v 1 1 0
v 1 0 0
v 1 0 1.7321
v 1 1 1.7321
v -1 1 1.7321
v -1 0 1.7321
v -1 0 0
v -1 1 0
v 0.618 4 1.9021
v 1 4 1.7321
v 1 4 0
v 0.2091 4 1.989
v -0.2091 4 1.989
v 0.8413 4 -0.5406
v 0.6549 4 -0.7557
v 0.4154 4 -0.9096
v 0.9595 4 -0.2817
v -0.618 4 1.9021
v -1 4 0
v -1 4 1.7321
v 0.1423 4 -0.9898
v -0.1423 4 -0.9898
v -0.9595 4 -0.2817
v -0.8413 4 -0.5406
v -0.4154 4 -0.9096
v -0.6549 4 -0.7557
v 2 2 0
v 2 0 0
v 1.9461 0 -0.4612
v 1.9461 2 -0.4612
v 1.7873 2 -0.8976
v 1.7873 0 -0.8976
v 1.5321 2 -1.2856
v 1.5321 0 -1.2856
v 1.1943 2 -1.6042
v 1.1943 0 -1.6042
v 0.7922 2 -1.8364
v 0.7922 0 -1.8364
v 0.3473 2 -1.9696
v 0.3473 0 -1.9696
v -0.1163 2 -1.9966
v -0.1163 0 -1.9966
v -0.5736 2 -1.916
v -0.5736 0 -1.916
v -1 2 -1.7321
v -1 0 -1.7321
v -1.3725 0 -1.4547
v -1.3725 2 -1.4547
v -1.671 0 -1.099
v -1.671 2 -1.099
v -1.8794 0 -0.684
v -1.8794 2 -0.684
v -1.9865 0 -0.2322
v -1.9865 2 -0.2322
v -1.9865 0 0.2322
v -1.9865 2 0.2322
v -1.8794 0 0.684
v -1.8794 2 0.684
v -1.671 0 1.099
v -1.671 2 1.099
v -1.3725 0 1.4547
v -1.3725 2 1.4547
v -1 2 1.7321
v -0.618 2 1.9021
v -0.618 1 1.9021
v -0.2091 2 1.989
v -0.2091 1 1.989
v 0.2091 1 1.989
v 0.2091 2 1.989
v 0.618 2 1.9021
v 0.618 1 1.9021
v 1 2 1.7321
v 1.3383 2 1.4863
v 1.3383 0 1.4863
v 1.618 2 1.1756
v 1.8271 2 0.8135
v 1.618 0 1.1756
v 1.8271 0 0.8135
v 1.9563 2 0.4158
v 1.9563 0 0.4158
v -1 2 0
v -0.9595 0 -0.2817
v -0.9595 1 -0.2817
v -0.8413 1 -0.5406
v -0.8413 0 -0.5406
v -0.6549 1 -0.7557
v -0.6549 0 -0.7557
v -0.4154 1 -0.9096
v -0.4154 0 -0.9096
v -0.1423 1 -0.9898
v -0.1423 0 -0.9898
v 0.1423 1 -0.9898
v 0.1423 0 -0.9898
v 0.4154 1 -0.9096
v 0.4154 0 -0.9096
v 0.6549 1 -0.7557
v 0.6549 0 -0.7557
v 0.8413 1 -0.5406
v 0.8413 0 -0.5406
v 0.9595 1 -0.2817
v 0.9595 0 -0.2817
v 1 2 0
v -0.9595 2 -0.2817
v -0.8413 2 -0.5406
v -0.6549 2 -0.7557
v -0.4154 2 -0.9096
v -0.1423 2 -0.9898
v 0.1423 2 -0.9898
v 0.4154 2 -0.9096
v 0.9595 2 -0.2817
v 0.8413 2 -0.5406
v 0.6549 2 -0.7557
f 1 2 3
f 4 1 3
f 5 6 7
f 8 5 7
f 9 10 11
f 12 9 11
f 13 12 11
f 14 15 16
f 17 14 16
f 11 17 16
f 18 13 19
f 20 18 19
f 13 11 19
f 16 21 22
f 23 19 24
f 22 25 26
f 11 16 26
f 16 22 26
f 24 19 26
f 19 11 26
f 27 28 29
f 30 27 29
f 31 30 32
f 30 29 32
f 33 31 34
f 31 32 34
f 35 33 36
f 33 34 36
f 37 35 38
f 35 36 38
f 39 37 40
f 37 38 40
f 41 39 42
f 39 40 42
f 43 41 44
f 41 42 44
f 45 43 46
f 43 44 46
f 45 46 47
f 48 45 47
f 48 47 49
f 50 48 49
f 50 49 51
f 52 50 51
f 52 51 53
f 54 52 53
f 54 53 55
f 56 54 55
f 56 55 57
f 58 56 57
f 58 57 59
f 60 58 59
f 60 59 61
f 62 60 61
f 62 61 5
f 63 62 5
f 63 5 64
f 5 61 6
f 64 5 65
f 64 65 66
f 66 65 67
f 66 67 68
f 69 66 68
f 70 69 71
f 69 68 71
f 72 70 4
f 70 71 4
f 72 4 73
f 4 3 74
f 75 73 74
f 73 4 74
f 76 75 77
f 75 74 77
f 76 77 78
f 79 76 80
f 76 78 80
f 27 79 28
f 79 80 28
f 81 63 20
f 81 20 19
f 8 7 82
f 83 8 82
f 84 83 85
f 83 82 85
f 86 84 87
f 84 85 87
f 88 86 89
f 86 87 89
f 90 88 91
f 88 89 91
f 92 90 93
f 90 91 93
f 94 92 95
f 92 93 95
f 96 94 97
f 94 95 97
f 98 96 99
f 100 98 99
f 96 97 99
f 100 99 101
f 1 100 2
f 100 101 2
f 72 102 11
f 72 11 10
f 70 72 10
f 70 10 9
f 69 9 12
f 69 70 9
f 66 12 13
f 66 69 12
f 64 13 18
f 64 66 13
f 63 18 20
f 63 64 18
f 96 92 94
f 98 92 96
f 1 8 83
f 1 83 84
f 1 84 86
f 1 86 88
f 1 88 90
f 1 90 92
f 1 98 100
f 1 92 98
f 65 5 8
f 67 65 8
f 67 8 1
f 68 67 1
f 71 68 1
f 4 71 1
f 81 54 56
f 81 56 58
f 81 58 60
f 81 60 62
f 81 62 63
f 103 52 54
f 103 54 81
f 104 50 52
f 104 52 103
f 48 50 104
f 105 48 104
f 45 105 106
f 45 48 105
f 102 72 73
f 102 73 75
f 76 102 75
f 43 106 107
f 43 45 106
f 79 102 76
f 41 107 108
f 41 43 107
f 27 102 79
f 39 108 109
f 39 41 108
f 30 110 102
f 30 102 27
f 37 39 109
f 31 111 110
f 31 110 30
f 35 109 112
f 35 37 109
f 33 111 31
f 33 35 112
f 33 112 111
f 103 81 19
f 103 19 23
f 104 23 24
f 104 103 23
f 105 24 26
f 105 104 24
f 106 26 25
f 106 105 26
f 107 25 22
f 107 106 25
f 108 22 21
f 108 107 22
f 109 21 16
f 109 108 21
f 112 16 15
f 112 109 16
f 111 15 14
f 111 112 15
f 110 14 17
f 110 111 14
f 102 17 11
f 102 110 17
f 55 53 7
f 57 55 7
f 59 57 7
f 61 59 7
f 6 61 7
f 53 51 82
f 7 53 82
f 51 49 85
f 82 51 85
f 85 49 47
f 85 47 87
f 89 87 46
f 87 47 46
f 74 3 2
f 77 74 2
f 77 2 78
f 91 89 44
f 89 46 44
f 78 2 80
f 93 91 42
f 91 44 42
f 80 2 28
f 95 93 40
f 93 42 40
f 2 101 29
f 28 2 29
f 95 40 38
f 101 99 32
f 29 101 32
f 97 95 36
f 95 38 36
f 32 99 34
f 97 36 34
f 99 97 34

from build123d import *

# Parameters (mm, degrees)
SKETCH1_R           = 2
BOSS_EXTRUDE1_DEPTH = 2
BOSS_EXTRUDE2_DEPTH = 2
CUT_EXTRUDE1_DEPTH  = 1


with BuildPart() as part:
    # Sketch1 → Boss-Extrude1 (new body)
    with BuildSketch(Plane(origin=(0, 0, 0), x_dir=(1, 0, 0), z_dir=(0, 1, 0))):
        Circle(SKETCH1_R)
    extrude(amount=BOSS_EXTRUDE1_DEPTH)

    # Sketch2 → Boss-Extrude2 (add)
    with BuildSketch(Plane(origin=(0, 2, 0), x_dir=(1, 0, 0), z_dir=(0, 1, 0))):
        with BuildLine():
            Line((-1, -1.732050808), (-1, 0))
            ThreePointArc((-1, 0), (0, 1), (1, 0))
            Line((1, 0), (1, -1.732050808))
            ThreePointArc((1, -1.732050808), (0, -2), (-1, -1.732050808))
        make_face()
    extrude(amount=BOSS_EXTRUDE2_DEPTH)

    # Sketch3 → Cut-Extrude1 (cut)
    with BuildSketch(Plane.XZ):
        with BuildLine():
            Line((-1, 1.732050808), (-1, 0))
            ThreePointArc((-1, 0), (0, -1), (1, 0))
            Line((1, 0), (1, 1.732050808))
            ThreePointArc((1, 1.732050808), (0, 2), (-1, 1.732050808))
        make_face()
    extrude(amount=-CUT_EXTRUDE1_DEPTH, mode=Mode.SUBTRACT)


solid = part.part
